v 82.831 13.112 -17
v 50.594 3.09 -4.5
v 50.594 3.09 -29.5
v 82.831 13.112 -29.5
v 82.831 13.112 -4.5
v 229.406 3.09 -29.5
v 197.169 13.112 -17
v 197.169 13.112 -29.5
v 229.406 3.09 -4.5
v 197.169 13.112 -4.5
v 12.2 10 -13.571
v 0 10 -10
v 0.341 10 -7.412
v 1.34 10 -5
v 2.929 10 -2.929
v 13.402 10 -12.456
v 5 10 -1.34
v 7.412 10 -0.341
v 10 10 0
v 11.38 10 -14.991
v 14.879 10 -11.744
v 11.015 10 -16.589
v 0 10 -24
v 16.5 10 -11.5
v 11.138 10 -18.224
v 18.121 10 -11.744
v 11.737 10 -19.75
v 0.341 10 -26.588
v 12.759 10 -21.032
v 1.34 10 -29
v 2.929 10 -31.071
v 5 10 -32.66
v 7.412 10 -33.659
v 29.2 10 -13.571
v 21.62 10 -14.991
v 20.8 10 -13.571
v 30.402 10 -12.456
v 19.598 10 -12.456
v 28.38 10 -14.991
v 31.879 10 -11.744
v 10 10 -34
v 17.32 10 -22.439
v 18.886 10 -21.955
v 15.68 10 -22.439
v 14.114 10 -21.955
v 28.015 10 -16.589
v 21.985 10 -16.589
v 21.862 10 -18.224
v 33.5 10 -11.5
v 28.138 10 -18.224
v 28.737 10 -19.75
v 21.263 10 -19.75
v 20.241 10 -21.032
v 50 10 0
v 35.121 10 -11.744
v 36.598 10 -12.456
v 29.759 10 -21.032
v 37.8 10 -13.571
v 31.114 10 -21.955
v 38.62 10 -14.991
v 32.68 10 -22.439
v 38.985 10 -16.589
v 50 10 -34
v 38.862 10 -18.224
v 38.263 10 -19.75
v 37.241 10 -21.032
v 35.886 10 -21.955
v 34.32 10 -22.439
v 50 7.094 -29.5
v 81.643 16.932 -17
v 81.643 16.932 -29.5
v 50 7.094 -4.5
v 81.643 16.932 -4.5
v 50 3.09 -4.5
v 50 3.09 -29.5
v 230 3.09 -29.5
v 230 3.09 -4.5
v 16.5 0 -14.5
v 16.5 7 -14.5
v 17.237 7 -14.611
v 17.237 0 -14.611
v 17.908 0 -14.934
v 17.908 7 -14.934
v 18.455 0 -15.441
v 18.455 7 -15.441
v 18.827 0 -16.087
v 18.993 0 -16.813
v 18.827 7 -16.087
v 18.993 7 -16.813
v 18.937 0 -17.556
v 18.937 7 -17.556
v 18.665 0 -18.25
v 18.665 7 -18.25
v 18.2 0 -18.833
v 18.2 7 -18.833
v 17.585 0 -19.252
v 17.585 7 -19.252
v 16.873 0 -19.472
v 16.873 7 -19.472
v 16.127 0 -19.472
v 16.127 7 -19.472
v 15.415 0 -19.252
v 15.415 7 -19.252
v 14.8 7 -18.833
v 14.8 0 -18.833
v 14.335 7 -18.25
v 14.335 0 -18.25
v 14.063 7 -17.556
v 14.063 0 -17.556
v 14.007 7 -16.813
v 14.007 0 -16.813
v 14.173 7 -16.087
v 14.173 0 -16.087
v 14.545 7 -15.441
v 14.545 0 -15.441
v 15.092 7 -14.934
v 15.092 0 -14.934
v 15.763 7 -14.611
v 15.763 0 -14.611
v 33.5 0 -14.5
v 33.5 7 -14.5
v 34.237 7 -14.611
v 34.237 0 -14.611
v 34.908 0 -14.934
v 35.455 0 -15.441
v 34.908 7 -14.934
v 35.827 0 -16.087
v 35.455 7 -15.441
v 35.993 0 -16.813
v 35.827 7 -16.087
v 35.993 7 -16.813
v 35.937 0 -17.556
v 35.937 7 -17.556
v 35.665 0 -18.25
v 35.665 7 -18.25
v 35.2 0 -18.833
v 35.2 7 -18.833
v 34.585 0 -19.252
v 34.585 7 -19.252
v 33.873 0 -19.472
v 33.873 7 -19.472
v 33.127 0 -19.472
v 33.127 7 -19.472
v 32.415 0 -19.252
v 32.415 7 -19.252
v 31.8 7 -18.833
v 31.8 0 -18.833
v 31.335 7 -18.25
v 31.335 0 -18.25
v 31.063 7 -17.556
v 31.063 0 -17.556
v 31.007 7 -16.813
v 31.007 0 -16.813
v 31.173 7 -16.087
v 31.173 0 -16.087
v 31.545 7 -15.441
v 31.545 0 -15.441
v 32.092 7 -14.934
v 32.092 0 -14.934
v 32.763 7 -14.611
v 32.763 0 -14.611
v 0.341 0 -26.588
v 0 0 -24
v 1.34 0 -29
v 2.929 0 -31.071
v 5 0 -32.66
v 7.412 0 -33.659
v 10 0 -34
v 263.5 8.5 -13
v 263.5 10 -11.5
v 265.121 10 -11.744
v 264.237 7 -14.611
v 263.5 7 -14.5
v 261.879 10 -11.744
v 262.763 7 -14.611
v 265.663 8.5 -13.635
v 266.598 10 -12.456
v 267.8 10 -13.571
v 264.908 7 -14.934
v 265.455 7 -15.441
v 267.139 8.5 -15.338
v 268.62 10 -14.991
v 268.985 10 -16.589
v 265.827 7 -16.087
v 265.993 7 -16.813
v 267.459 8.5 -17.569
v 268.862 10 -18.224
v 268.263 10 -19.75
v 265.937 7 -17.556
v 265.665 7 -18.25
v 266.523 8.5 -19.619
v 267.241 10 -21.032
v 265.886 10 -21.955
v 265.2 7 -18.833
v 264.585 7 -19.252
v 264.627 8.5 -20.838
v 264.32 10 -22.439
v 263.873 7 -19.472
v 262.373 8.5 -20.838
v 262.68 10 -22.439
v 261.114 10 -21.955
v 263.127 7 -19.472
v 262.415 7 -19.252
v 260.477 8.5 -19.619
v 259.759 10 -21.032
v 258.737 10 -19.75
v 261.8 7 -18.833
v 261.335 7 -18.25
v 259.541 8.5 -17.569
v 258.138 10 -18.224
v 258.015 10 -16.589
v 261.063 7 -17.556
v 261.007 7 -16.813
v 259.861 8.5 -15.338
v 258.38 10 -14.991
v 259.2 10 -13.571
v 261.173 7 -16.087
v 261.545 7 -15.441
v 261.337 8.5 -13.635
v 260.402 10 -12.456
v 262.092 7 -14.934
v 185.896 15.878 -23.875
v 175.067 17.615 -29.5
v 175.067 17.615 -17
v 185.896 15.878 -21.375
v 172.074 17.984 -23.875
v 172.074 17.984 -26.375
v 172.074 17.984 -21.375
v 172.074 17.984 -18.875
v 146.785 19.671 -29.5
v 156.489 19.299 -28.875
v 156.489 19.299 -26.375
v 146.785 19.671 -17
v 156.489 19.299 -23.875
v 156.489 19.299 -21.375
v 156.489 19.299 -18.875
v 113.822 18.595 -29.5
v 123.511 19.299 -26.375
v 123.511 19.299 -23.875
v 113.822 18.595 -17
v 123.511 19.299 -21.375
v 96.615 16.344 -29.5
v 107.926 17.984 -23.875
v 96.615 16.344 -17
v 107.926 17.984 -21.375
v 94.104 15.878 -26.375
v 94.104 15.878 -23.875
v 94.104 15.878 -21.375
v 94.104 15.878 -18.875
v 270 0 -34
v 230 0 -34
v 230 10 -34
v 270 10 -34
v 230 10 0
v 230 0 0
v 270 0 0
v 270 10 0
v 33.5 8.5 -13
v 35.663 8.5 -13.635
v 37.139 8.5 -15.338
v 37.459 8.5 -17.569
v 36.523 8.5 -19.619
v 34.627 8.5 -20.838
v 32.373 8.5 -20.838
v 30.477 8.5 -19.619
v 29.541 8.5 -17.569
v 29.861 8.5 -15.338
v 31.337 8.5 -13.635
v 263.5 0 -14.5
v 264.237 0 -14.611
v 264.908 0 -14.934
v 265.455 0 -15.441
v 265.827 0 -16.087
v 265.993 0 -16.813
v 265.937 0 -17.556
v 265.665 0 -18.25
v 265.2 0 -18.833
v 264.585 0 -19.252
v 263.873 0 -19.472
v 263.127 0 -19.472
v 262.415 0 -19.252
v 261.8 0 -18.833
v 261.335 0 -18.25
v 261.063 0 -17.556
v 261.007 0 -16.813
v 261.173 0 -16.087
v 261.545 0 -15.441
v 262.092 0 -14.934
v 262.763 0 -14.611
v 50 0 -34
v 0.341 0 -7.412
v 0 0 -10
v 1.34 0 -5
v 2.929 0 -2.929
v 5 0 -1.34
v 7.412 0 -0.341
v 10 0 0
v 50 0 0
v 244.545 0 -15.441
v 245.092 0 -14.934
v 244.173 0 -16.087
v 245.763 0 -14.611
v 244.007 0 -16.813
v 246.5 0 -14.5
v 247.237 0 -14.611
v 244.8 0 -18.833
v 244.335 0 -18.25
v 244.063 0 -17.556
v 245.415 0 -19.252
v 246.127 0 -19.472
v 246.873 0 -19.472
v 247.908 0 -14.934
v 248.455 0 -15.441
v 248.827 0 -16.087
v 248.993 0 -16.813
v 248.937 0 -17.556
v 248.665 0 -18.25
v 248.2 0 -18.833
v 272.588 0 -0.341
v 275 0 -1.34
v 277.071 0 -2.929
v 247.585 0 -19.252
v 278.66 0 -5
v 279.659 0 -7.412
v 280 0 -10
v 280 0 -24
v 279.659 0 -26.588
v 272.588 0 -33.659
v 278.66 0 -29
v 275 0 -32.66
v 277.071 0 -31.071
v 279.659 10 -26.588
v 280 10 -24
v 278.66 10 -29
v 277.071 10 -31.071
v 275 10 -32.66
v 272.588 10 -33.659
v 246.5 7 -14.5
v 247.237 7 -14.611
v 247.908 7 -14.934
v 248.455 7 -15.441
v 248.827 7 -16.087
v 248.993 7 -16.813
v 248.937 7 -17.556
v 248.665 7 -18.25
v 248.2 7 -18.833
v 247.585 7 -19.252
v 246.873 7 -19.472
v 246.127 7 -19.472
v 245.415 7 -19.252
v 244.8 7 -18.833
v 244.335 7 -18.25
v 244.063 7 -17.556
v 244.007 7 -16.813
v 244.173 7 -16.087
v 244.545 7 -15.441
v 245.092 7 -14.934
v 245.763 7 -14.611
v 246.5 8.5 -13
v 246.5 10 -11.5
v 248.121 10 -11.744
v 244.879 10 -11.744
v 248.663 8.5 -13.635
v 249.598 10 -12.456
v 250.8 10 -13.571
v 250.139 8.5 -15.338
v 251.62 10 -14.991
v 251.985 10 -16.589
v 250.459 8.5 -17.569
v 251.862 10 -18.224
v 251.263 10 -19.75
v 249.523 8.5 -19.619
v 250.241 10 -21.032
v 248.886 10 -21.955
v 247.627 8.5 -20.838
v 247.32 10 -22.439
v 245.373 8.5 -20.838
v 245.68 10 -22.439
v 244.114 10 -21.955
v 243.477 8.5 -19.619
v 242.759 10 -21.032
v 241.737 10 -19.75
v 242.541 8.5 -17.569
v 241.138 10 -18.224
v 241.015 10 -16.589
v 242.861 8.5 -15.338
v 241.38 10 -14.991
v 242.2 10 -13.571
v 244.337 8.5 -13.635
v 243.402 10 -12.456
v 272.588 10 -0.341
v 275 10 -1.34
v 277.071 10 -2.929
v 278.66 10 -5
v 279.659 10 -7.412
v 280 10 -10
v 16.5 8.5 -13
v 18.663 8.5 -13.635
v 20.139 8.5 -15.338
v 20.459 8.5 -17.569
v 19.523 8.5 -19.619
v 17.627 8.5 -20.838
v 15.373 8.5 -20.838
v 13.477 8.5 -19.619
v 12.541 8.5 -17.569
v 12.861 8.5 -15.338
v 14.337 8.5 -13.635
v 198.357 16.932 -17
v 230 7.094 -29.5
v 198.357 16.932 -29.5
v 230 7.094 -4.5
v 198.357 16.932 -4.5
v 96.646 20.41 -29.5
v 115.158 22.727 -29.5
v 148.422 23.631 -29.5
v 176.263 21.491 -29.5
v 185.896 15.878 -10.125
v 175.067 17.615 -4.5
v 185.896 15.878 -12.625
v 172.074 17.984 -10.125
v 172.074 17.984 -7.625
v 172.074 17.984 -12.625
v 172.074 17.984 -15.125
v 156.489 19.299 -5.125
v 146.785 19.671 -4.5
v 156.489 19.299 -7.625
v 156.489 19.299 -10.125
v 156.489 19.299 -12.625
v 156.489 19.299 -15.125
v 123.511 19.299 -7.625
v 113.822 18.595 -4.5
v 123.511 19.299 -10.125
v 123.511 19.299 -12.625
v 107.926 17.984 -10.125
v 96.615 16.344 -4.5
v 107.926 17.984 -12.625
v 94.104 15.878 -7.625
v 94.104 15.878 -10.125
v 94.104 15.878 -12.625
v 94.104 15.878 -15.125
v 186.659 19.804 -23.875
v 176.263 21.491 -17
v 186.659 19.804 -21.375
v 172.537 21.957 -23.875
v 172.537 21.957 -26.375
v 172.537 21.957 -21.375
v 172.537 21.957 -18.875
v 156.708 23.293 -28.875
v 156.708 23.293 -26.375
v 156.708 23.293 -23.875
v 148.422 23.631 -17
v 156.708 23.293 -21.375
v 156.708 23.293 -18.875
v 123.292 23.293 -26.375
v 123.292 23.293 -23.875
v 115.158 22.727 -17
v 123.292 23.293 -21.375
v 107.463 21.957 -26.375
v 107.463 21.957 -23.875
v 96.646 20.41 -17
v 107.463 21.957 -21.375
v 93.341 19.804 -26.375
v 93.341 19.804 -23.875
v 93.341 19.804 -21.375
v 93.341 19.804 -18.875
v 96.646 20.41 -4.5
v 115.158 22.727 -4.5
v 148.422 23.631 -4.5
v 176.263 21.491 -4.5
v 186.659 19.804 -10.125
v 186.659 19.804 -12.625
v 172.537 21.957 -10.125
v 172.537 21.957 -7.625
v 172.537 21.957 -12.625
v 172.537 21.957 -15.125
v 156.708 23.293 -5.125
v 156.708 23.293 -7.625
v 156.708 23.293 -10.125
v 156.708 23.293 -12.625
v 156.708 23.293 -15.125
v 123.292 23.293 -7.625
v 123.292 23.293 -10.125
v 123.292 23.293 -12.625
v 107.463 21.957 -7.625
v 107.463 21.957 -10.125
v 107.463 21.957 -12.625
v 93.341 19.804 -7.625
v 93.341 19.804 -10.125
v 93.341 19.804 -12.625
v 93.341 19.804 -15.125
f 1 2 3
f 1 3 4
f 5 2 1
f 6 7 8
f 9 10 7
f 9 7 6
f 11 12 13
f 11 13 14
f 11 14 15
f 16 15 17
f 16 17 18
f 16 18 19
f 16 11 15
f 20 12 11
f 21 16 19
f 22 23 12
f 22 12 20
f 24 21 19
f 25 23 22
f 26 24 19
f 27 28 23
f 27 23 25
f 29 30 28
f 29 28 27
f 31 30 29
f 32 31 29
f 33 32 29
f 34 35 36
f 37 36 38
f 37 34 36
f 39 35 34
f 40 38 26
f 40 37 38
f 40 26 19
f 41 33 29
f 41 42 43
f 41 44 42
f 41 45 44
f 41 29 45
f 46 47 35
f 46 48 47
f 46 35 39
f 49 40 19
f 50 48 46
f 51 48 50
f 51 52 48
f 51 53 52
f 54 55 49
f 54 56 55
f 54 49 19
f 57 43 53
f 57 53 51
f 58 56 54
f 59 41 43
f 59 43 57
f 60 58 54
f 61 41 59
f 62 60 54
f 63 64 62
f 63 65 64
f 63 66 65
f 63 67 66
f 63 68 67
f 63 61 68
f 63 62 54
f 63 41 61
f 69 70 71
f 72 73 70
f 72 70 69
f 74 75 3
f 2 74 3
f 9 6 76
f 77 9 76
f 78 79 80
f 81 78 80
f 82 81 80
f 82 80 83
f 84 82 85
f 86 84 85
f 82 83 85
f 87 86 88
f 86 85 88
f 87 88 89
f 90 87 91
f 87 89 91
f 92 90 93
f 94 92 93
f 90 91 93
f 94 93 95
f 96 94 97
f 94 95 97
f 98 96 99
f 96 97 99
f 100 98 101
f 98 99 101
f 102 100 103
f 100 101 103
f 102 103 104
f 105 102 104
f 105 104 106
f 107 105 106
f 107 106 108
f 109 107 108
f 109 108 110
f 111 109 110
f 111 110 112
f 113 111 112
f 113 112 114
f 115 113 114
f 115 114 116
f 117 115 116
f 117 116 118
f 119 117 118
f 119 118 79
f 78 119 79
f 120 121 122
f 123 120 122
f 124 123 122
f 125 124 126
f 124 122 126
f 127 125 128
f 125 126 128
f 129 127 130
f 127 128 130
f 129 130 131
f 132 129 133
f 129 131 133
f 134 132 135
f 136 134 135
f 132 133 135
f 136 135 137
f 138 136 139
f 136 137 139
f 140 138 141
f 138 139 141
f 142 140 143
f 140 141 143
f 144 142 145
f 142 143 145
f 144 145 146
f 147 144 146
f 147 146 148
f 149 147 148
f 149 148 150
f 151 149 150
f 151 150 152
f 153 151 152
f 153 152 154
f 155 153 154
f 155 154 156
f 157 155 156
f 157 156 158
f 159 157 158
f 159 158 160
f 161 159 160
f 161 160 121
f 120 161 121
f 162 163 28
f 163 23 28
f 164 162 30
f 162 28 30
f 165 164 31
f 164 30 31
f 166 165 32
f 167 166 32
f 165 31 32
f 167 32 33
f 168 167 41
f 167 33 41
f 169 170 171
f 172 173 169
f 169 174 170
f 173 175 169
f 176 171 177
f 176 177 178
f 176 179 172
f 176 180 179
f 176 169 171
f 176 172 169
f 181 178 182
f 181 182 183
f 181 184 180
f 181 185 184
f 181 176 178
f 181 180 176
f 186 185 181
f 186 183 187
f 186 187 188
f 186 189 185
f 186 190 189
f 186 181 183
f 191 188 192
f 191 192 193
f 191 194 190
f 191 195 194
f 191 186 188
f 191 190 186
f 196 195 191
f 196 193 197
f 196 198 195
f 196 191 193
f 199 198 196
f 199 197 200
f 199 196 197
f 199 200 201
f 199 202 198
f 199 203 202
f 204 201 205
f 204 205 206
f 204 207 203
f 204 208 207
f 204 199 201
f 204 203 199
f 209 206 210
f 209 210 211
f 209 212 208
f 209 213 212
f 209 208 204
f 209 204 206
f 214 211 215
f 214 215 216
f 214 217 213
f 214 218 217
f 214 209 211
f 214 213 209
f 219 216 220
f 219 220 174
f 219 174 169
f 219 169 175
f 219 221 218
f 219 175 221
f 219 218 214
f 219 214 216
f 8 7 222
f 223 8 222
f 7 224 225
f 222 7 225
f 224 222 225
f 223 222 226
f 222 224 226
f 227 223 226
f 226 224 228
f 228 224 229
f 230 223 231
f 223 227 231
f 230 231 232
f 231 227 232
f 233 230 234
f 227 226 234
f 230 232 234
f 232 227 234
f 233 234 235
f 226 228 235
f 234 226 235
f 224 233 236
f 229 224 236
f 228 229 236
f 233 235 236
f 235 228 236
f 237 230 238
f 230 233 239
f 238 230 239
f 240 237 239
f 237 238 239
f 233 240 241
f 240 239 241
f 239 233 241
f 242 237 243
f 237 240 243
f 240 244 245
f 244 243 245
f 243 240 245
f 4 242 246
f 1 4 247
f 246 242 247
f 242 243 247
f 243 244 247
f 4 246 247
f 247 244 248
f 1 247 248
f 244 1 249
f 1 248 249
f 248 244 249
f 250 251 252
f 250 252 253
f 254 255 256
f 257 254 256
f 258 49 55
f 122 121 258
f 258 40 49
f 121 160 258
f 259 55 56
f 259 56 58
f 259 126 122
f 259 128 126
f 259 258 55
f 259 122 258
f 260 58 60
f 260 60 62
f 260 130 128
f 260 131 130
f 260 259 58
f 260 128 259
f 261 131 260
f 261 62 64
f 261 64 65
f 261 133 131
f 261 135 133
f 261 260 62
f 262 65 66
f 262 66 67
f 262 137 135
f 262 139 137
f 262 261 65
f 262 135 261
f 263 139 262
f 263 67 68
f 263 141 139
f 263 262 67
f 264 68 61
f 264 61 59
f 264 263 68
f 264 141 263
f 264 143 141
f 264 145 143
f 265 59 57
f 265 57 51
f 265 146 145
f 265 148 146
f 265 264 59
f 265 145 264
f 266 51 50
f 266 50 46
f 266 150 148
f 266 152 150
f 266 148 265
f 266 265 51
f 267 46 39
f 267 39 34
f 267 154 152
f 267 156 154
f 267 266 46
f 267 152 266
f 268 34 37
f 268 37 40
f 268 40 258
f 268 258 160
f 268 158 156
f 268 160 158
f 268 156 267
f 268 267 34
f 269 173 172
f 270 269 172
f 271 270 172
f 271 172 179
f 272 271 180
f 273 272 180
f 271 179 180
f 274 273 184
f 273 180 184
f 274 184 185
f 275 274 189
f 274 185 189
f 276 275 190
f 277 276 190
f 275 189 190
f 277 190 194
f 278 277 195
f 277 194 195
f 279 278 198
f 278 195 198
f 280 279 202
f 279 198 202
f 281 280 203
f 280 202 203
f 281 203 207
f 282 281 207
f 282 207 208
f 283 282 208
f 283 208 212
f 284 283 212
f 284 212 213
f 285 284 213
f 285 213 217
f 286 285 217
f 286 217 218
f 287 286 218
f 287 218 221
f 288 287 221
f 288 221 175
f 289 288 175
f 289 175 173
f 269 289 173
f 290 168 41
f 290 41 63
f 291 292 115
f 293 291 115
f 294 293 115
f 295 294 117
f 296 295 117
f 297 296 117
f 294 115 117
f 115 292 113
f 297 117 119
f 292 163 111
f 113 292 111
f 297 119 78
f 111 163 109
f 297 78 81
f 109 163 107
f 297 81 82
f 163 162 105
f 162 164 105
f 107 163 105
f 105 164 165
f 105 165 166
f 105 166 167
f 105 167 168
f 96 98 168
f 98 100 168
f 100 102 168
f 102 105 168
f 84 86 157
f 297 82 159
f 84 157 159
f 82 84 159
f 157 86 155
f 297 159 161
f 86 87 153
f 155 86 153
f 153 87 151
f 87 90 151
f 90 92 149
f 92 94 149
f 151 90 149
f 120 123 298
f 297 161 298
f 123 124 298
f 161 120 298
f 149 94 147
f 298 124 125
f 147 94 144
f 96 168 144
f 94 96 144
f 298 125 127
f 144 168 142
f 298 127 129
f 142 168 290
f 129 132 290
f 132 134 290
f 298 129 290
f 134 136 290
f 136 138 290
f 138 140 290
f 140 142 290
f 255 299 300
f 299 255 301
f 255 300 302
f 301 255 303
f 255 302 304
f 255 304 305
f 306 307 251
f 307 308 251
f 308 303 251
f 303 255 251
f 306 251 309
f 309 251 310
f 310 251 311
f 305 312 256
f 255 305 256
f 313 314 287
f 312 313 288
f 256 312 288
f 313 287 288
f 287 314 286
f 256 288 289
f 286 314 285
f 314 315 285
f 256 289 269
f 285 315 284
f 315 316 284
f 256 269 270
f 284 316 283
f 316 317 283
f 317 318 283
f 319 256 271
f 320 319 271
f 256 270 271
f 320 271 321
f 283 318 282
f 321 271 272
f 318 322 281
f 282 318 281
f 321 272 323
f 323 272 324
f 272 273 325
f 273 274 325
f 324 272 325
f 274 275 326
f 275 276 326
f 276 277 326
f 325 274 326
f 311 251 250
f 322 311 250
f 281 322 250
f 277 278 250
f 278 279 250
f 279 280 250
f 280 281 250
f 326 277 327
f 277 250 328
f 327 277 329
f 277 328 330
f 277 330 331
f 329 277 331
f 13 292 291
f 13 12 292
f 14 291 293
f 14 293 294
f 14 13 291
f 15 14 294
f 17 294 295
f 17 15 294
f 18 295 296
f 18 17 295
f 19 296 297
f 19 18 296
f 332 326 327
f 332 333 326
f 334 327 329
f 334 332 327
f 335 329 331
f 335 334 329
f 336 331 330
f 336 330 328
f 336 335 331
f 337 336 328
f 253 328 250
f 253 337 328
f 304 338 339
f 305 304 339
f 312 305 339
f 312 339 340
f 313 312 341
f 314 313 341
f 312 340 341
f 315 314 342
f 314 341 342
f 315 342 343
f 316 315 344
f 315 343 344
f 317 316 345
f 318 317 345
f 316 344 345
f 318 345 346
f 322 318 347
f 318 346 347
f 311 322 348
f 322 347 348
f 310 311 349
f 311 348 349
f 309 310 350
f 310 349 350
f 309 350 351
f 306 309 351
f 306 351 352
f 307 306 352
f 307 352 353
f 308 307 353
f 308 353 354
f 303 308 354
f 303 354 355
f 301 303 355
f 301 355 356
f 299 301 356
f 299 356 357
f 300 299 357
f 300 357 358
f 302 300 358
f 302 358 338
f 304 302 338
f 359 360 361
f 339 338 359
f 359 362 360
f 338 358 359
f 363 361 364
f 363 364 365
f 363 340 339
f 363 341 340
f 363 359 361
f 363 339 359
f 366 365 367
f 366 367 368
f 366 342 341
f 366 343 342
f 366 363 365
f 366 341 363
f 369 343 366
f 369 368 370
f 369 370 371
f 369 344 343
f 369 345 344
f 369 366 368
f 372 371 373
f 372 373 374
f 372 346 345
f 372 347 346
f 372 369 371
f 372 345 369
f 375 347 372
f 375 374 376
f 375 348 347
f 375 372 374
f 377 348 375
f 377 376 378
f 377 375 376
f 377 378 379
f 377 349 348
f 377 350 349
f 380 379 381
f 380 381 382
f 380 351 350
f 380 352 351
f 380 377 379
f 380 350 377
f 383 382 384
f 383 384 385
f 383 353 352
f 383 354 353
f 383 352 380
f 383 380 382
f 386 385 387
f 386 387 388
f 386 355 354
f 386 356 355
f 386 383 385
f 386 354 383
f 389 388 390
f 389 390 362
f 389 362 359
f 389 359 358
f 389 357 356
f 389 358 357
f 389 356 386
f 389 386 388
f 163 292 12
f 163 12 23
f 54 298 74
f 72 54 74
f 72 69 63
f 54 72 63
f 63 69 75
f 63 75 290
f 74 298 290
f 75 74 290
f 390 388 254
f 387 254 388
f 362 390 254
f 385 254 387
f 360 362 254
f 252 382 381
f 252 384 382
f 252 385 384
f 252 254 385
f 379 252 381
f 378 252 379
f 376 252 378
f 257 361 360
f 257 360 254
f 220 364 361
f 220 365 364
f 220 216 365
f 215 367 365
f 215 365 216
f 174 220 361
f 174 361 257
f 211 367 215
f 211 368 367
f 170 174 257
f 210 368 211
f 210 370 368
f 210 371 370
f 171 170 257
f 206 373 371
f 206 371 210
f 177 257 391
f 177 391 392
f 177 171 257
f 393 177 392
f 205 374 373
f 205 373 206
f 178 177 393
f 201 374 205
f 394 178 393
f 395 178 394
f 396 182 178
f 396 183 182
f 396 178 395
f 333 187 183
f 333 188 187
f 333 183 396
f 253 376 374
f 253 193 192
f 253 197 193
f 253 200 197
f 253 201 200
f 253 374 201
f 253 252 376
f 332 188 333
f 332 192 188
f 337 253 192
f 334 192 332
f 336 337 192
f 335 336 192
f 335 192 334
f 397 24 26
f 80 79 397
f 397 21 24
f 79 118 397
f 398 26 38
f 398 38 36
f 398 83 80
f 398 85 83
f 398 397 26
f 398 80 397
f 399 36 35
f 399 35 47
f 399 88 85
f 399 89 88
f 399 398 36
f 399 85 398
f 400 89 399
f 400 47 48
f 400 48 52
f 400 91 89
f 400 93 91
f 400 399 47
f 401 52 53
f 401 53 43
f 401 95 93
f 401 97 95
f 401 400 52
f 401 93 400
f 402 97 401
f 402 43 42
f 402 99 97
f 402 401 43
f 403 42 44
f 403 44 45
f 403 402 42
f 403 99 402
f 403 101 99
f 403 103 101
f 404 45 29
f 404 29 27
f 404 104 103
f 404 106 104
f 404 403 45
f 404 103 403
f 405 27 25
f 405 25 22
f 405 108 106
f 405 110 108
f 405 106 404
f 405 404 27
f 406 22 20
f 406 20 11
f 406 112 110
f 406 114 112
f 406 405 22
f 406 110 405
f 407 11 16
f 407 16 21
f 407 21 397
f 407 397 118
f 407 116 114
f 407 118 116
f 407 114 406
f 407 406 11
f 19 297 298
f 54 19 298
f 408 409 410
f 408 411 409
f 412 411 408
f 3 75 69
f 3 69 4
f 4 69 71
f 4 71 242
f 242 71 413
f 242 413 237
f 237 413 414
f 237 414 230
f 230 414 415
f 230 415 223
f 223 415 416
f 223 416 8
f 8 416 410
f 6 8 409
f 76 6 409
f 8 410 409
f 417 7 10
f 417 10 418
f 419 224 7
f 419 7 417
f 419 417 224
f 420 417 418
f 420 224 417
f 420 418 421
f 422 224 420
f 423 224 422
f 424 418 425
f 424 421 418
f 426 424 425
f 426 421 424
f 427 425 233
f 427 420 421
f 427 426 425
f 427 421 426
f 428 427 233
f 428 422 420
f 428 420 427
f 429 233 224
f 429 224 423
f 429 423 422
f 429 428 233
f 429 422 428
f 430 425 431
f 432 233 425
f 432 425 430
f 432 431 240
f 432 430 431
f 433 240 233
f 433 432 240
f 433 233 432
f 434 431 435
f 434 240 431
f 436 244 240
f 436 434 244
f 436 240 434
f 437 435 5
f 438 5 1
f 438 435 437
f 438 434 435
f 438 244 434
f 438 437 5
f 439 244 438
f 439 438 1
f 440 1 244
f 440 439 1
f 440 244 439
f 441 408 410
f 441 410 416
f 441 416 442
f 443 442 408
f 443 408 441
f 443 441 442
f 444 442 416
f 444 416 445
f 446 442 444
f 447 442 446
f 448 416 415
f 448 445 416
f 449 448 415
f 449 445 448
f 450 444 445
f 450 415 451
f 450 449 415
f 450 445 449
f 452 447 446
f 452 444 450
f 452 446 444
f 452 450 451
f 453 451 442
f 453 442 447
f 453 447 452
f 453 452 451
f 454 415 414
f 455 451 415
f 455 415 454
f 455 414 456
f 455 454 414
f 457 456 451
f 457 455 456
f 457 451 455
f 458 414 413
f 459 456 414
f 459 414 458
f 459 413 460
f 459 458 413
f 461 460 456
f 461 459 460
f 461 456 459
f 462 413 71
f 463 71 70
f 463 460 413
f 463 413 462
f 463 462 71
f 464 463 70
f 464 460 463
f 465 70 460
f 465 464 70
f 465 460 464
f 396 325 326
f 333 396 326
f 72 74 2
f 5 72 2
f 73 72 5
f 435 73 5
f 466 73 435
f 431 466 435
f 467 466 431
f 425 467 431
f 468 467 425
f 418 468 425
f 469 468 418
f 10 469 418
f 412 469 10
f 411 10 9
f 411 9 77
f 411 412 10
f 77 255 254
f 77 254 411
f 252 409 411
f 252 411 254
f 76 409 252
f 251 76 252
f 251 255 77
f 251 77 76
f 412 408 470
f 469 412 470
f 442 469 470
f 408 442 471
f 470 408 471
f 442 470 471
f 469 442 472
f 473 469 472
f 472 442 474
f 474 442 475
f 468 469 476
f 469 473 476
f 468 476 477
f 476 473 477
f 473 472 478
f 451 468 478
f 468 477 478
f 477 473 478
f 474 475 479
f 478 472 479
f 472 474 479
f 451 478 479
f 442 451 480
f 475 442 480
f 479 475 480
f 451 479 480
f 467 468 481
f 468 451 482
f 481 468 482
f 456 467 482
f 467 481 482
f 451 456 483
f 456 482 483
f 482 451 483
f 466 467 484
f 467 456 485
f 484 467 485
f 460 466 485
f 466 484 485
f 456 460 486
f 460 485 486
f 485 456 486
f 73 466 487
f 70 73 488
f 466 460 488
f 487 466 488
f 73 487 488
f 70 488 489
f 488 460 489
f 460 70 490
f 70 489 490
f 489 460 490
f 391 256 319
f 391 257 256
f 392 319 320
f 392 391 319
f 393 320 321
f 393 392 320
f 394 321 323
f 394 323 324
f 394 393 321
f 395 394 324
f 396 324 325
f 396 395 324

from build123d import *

# Parameters (mm, degrees)
SKETCH1_W             = 50
SKETCH1_H             = 34
BOSS_EXTRUDE1_DEPTH   = 10
BOSS_EXTRUDE1_2_DEPTH = 10
FILLET1_R             = 10
FILLET2_R             = 10
BOSS_EXTRUDE2_DEPTH   = 12.5
SKETCH4_R             = 2.5
CUT_EXTRUDE1_DEPTH    = 283.391465155
CHAMFER1_SIZE         = 3


with BuildPart() as part:
    # Sketch1 → Boss-Extrude1 (new body)
    with BuildSketch(Plane(origin=(0, 0, 0), x_dir=(1, 0, 0), z_dir=(0, 1, 0))):
        with Locations((25, 17)):
            Rectangle(SKETCH1_W, SKETCH1_H)
    extrude(amount=BOSS_EXTRUDE1_DEPTH)

    # Fillet1
    fillet1_edges = [part.edges().sort_by_distance(p)[0] for p in [
        (0, 5, -34),
        (0, 5, 0),
    ]]
    fillet(fillet1_edges, radius=FILLET1_R)



with BuildPart() as body_2:
    # Sketch1 → Boss-Extrude1 2 (new body)
    with BuildSketch(Plane(origin=(0, 0, 0), x_dir=(1, 0, 0), z_dir=(0, 1, 0))):
        with Locations((255, 17)):
            Rectangle(SKETCH1_W, SKETCH1_H)
    extrude(amount=BOSS_EXTRUDE1_2_DEPTH)

    # Fillet2
    fillet2_edges = [body_2.edges().sort_by_distance(p)[0] for p in [
        (280, 5, -34),
        (280, 5, 0),
    ]]
    fillet(fillet2_edges, radius=FILLET2_R)


with BuildPart() as part_1:
    add(part.part)

    add(body_2.part)  # Boss-Extrude2 merges body 2
    # Sketch3 → Boss-Extrude2 (add, symmetric)
    with BuildSketch(Plane.XY.offset(-17)):
        with BuildLine():
            Line((230, 7.094420761), (198.356689293, 16.93185641))
            add(Edge.make_bspline(
                [(198.356689293, 16.93185641), (197.921485468, 17.06715482), (197.058320029, 17.327430882), (195.247018989, 17.842283694), (192.878899734, 18.458259291), (189.862315722, 19.156901641), (185.625111362, 20.030310935), (179.946744848, 21.009637357), (172.608544526, 21.991371788), (164.84084187, 22.767908957), (154.046889349, 23.517083016), (140, 23.897827649), (125.953110651, 23.517083016), (115.15915813, 22.767908957), (107.391455474, 21.991371788), (100.053255152, 21.009637357), (94.374888638, 20.030310935), (90.137684278, 19.156901641), (87.121100266, 18.458259291), (84.752981011, 17.842283694), (82.941679971, 17.327430882), (82.078514532, 17.06715482), (81.643310707, 16.93185641)],
                knots=[0.641614074, 0.641614074, 0.641614074, 0.641614074, 0.67065102, 0.699687965, 0.757761856, 0.815835747, 0.873909637, 0.990057419, 1.106205201, 1.222352982, 1.338500764, 1.570796327, 1.80309189, 1.919239671, 2.035387453, 2.151535235, 2.267683016, 2.325756907, 2.383830798, 2.441904688, 2.470941634, 2.499978579, 2.499978579, 2.499978579, 2.499978579], degree=3))
            Line((81.643310707, 16.93185641), (50, 7.094420761))
            Line((50, 7.094420761), (50, 3.090164081))
            Line((50, 3.090164081), (50.593739641, 3.090164081))
            Line((50.593739641, 3.090164081), (82.83078999, 13.112184572))
            add(Edge.make_bspline(
                [(197.16921001, 13.112184572), (196.755159459, 13.240906743), (195.935388877, 13.488101862), (194.203464644, 13.980443227), (191.927236958, 14.572619906), (189.009827951, 15.248400933), (184.89320594, 16.097058438), (179.347389143, 17.053860827), (172.148362972, 18.017197671), (164.506098732, 18.781331097), (153.867128529, 19.519872284), (140, 19.895968137), (126.132871471, 19.519872284), (115.493901268, 18.781331097), (107.851637028, 18.017197671), (100.652610857, 17.053860827), (95.10679406, 16.097058438), (90.990172049, 15.248400933), (88.072763042, 14.572619906), (85.796535356, 13.980443227), (84.064611123, 13.488101862), (83.244840541, 13.240906743), (82.83078999, 13.112184572)],
                knots=[0.641614074, 0.641614074, 0.641614074, 0.641614074, 0.67065102, 0.699687965, 0.757761856, 0.815835747, 0.873909637, 0.990057419, 1.106205201, 1.222352982, 1.338500764, 1.570796327, 1.80309189, 1.919239671, 2.035387453, 2.151535235, 2.267683016, 2.325756907, 2.383830798, 2.441904688, 2.470941634, 2.499978579, 2.499978579, 2.499978579, 2.499978579], degree=3))
            Line((197.16921001, 13.112184572), (229.406260359, 3.090164081))
            Line((229.406260359, 3.090164081), (230, 3.090164081))
            Line((230, 3.090164081), (230, 7.094420761))
        make_face()
    extrude(amount=BOSS_EXTRUDE2_DEPTH, both=True)

    # Sketch4 → Cut-Extrude1 (cut, through all)
    with BuildSketch(Plane(origin=(0, 10, 0), x_dir=(1, 0, 0), z_dir=(0, 1, 0))):
        with Locations(Location((16.5, 17, 0), (0, 0, 270))):
            Circle(SKETCH4_R)
        with Locations(Location((33.5, 17, 0), (0, 0, 270))):
            Circle(SKETCH4_R)
        with Locations(Location((246.5, 17, 0), (0, 0, 270))):
            Circle(SKETCH4_R)
        with Locations(Location((263.5, 17, 0), (0, 0, 270))):
            Circle(SKETCH4_R)
    extrude(amount=-CUT_EXTRUDE1_DEPTH, mode=Mode.SUBTRACT)

    # Chamfer1
    chamfer1_edges = [part_1.edges().sort_by_distance(p)[0] for p in [
        (16.5, 10, -19.5),
        (33.5, 10, -19.5),
        (246.5, 10, -19.5),
        (263.5, 10, -19.5),
    ]]
    chamfer(chamfer1_edges, length=CHAMFER1_SIZE)


solid = part_1.part
